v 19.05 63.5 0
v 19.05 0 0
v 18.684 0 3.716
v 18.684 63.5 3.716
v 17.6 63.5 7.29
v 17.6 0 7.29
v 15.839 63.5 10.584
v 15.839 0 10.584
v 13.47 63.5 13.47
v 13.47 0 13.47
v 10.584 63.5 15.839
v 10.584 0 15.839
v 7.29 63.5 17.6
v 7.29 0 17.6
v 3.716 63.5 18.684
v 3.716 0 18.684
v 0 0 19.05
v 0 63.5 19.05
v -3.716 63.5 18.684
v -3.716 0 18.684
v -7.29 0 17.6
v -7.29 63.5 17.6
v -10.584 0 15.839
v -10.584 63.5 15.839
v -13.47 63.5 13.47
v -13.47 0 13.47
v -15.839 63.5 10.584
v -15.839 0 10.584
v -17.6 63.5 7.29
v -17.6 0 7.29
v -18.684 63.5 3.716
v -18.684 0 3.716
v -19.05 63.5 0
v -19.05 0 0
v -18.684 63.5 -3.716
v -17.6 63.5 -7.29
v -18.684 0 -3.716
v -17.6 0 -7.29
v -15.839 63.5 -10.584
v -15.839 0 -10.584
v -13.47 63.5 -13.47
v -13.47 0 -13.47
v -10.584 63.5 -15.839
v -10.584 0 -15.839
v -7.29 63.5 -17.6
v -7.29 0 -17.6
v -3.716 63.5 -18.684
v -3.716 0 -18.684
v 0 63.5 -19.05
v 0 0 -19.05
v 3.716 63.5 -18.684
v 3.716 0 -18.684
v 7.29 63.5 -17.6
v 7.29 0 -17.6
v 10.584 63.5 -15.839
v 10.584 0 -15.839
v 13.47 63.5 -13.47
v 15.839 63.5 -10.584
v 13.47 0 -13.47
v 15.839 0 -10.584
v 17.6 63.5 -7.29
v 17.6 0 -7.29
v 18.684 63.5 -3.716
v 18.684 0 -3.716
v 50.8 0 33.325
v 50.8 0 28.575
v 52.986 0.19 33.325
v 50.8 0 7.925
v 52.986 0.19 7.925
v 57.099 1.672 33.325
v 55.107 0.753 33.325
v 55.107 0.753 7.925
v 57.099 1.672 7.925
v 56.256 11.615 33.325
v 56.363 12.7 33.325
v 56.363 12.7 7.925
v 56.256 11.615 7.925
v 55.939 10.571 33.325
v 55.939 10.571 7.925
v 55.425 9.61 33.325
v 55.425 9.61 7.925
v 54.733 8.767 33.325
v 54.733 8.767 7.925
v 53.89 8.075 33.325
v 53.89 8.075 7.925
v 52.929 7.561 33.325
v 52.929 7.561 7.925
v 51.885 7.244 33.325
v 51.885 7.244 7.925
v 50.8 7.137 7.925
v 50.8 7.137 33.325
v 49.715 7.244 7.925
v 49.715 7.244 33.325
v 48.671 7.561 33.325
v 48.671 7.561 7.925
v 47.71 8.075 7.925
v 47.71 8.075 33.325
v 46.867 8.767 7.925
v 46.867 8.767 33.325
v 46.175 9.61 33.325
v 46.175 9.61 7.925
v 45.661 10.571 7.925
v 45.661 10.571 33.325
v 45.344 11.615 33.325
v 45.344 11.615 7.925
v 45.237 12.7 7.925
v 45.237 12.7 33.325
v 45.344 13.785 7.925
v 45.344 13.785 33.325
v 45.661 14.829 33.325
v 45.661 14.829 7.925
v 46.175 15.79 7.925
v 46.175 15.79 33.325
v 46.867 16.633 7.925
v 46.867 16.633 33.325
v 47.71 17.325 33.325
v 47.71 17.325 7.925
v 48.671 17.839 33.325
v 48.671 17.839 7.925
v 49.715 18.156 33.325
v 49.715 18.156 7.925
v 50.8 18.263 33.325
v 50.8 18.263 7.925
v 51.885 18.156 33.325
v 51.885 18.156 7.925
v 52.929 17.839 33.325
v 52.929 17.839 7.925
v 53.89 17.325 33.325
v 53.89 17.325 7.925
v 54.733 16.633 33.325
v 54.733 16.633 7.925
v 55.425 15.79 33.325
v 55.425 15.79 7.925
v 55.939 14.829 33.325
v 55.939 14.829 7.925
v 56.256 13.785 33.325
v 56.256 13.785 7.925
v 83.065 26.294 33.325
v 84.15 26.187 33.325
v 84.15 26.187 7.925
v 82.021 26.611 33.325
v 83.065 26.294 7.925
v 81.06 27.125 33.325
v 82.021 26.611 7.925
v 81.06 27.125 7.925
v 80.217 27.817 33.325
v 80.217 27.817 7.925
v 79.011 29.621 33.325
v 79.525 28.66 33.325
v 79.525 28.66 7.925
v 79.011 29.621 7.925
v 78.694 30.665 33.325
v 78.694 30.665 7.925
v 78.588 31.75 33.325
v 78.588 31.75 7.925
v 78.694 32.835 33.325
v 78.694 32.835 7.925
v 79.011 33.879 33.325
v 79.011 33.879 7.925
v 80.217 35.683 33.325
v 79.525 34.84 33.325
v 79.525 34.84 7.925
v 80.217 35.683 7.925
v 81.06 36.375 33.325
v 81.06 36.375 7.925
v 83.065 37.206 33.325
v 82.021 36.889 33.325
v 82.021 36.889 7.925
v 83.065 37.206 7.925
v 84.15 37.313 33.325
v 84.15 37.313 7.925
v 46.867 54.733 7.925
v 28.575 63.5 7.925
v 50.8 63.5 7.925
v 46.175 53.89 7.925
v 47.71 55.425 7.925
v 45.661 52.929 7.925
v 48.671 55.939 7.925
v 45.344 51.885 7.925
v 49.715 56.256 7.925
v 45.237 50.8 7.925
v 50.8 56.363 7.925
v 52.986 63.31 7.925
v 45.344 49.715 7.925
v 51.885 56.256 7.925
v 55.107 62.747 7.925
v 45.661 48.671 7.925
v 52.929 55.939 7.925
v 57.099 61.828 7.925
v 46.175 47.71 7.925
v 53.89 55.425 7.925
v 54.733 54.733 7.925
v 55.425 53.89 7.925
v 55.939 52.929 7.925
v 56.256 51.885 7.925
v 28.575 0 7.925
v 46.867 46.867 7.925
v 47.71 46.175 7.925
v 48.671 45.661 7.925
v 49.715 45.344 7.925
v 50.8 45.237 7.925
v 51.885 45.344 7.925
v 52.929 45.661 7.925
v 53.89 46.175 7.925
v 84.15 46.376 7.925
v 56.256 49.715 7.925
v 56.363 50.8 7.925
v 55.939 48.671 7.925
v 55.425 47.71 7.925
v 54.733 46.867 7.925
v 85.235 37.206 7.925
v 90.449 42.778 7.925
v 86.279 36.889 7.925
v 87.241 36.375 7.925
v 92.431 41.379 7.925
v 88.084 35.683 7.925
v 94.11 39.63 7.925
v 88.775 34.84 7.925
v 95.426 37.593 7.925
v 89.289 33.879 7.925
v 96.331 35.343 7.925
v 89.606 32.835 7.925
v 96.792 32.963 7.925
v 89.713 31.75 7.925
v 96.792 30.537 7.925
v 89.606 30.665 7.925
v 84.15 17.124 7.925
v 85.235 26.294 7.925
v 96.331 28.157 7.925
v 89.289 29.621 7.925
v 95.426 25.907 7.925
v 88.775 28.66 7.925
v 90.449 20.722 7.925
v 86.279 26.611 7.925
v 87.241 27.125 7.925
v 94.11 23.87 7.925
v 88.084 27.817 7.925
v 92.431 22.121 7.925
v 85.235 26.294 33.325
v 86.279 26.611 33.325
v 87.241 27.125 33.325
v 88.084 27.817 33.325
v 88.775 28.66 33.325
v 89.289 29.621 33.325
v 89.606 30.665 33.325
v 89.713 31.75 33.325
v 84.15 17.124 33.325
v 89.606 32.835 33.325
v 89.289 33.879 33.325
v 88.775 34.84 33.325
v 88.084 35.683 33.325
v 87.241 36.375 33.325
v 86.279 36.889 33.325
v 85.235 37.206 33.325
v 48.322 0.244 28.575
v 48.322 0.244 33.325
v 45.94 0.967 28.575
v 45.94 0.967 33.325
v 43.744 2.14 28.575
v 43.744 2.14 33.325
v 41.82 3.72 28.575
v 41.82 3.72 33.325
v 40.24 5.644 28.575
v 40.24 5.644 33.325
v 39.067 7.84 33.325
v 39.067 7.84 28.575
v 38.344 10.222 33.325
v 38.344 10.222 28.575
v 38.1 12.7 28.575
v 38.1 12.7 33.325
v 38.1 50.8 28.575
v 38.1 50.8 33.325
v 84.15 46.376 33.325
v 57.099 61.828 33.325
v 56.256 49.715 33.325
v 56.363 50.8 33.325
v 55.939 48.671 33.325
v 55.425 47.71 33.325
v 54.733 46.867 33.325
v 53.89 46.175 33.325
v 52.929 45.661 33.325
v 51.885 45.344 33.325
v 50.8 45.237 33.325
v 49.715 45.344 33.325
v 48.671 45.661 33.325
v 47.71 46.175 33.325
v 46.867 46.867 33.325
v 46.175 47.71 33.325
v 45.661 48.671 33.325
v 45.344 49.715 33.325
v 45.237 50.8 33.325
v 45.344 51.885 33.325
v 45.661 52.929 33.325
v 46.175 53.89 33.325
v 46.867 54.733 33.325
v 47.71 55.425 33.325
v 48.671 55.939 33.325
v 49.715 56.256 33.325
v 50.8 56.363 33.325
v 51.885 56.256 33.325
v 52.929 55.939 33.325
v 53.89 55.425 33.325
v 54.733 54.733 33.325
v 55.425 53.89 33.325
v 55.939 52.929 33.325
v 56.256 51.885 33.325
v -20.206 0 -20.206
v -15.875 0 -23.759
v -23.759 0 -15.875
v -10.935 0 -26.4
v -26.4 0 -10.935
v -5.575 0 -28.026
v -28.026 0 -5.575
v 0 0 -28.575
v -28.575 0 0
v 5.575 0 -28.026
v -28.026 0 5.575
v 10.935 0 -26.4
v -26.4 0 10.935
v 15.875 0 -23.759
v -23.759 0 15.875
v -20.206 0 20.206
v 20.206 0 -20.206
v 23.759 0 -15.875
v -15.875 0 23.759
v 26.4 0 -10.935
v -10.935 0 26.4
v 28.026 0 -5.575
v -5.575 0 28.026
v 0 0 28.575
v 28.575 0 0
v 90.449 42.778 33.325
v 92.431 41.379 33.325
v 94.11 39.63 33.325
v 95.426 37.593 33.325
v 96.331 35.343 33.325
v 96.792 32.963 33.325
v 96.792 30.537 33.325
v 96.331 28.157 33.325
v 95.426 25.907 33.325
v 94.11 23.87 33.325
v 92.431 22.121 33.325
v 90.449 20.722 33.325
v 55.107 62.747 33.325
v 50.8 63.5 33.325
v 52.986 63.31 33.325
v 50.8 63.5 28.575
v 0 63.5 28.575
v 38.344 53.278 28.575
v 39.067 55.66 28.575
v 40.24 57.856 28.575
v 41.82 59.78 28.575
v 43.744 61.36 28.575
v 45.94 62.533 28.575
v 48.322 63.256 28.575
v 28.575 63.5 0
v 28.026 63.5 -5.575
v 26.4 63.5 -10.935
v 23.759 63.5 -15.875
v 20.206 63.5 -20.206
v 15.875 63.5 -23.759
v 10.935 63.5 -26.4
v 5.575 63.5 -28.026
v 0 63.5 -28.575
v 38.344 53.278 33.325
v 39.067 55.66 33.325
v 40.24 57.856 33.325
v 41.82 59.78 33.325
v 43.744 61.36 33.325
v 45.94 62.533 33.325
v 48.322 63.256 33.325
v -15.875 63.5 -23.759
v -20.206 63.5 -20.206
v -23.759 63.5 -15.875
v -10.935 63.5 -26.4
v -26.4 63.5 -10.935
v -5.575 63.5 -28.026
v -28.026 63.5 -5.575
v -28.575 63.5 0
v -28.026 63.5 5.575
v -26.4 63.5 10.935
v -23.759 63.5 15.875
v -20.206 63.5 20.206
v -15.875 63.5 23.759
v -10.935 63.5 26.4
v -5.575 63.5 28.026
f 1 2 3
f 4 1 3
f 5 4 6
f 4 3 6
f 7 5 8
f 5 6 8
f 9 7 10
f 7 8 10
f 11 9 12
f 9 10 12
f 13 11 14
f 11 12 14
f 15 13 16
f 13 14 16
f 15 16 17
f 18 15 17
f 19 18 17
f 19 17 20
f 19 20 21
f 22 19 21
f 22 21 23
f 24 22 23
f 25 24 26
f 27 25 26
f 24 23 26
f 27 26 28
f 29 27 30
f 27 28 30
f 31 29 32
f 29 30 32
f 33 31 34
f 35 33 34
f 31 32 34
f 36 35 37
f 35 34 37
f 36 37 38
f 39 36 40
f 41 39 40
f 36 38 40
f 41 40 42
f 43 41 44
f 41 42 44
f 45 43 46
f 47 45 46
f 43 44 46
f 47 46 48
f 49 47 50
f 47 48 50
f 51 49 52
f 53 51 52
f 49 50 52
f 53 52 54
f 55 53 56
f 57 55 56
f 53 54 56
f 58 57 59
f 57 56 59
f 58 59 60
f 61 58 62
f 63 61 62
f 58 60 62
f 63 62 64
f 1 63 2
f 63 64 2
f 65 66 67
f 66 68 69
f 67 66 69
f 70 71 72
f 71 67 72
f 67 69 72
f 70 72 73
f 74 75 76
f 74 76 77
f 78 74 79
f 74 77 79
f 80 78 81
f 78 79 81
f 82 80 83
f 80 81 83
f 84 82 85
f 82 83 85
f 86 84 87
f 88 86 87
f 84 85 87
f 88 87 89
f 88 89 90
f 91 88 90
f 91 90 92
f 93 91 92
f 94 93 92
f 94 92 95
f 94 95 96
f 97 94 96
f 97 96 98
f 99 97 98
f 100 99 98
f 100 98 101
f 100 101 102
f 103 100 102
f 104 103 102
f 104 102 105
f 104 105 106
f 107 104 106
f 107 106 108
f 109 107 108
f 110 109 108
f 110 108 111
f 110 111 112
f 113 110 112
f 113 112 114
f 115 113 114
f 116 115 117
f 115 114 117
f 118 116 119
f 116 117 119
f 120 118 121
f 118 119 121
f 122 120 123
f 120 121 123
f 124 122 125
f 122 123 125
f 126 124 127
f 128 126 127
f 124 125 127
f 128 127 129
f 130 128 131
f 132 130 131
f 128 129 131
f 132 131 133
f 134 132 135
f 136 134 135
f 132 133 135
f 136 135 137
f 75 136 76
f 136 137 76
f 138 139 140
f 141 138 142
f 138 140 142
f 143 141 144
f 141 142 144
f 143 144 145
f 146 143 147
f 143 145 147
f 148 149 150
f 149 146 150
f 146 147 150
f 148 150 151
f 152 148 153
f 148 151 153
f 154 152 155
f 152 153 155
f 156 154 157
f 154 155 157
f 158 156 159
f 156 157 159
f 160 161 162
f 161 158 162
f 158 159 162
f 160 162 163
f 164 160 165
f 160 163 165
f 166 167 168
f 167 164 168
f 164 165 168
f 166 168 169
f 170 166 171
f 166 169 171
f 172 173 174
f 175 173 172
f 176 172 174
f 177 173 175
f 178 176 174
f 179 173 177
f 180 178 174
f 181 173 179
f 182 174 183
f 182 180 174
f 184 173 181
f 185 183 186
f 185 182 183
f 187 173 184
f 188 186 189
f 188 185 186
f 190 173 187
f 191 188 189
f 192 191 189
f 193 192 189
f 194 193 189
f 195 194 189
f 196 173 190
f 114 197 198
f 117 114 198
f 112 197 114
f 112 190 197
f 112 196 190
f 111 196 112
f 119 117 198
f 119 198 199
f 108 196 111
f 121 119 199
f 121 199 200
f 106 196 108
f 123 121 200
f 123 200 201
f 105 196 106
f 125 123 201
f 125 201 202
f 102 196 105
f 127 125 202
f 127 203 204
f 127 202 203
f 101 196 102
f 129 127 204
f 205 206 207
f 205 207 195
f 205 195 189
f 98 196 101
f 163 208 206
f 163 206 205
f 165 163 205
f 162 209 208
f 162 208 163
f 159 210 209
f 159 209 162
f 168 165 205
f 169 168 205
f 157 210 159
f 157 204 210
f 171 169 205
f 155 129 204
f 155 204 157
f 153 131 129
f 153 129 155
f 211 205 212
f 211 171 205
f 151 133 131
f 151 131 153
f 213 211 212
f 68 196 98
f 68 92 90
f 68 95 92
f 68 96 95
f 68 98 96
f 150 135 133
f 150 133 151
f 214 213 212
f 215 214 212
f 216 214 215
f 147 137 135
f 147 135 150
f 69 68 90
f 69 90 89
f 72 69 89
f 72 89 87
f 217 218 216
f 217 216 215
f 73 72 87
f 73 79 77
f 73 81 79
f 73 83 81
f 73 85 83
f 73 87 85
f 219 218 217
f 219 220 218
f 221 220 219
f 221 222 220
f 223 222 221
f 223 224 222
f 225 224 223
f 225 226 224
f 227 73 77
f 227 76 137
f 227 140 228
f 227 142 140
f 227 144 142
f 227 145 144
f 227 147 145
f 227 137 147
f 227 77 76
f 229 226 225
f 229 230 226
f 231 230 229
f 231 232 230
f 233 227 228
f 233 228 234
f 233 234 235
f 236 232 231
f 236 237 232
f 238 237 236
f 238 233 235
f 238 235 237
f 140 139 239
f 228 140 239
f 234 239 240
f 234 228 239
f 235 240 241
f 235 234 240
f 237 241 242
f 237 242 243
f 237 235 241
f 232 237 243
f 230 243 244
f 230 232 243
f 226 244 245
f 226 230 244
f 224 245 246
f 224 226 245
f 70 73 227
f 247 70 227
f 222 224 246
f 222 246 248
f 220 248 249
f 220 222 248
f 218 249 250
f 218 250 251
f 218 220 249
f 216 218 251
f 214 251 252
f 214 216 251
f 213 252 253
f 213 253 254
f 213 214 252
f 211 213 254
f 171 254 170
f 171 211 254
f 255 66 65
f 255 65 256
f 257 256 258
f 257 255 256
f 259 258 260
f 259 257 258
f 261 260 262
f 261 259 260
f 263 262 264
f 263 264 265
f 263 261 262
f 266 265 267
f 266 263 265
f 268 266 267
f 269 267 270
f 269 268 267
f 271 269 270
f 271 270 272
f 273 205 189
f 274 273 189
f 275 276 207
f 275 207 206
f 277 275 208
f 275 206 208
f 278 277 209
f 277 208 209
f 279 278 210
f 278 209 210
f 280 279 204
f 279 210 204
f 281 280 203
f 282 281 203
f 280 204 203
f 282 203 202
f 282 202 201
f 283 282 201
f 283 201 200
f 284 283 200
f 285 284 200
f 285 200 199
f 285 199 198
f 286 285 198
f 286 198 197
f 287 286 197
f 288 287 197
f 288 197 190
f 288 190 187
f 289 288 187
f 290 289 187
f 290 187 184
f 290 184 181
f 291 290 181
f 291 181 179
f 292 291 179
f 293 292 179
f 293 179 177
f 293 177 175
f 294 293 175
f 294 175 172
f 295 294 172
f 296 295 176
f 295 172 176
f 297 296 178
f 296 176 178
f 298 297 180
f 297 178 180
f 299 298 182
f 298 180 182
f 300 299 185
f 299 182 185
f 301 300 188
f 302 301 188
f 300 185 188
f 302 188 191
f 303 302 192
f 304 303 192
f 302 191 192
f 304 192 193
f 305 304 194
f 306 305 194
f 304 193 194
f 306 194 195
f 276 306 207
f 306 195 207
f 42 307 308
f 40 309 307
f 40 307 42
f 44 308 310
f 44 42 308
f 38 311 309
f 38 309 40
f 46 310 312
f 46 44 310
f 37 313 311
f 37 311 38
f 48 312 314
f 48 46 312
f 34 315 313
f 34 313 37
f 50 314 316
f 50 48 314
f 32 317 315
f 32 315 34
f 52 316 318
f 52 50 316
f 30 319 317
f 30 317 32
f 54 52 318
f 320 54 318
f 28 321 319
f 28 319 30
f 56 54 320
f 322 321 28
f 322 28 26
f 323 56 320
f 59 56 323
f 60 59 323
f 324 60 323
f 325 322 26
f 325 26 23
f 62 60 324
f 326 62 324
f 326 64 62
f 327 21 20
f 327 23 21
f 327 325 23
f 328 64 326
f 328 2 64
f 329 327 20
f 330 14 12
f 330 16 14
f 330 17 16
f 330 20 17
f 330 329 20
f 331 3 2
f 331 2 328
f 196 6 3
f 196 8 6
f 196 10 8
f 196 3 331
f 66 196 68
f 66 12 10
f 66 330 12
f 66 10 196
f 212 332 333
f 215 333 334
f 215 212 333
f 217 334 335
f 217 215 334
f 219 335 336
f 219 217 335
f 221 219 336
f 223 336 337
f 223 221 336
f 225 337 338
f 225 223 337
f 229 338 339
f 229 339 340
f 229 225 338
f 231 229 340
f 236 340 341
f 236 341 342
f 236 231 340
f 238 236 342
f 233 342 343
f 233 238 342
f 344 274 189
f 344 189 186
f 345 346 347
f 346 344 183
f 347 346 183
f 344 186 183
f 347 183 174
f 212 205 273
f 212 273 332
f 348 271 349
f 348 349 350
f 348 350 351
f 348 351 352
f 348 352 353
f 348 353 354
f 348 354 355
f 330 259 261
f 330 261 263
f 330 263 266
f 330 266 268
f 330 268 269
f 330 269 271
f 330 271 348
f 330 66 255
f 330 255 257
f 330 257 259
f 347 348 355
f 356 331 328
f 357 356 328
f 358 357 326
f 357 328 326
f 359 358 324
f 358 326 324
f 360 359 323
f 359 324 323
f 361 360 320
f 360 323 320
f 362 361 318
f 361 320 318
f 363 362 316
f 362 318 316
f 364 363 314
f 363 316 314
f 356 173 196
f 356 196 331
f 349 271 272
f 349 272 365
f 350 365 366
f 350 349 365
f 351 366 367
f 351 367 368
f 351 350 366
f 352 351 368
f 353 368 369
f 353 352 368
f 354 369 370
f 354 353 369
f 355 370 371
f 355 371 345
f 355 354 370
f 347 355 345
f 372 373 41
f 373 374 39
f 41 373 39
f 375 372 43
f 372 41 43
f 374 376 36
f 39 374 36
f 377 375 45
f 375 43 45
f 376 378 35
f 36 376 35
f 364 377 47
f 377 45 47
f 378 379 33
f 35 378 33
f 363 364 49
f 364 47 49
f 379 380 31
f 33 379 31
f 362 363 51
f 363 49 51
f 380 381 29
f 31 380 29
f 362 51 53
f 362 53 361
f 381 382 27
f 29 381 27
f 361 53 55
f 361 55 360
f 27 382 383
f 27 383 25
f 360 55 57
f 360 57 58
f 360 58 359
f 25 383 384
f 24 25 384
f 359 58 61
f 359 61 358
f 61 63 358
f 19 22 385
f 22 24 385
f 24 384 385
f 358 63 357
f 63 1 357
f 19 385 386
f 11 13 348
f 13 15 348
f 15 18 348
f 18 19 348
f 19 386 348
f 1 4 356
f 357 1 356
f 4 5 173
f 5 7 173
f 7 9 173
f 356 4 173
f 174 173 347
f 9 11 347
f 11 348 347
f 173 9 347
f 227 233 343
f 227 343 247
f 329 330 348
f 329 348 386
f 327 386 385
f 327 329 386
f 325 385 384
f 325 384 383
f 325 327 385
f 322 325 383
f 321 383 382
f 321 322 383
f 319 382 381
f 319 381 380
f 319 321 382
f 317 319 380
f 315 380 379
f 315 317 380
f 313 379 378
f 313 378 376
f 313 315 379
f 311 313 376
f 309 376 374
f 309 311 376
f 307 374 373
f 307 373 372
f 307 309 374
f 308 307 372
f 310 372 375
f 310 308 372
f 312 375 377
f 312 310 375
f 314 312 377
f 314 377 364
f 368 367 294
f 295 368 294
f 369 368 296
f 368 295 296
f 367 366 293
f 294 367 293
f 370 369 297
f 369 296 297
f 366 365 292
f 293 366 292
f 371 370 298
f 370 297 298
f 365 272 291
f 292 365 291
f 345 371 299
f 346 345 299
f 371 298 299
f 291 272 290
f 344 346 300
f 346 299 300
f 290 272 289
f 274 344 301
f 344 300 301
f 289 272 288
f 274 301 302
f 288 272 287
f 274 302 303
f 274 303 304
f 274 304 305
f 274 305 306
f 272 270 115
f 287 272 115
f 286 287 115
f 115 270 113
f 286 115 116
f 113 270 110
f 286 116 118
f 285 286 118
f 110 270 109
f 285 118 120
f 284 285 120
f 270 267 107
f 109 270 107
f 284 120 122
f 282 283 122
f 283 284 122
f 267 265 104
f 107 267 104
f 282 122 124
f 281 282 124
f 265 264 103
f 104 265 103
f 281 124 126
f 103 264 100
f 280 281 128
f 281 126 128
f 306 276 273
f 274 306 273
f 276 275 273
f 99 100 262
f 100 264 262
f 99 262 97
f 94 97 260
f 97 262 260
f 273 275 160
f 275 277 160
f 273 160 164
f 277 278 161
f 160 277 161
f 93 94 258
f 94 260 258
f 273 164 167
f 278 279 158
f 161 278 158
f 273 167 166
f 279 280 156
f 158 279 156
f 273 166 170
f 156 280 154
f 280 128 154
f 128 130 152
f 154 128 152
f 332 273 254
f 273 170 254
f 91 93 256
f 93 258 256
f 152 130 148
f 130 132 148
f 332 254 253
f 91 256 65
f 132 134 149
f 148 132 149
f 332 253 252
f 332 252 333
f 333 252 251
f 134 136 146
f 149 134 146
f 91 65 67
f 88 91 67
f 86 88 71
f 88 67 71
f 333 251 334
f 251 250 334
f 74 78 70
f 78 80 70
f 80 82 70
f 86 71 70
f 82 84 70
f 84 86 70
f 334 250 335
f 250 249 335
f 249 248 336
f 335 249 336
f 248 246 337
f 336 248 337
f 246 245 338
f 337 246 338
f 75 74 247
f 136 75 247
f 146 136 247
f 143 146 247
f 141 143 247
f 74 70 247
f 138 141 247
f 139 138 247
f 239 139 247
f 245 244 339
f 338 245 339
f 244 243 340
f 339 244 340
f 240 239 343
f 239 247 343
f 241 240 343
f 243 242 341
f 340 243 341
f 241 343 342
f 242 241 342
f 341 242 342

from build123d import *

# Parameters (mm, degrees)
F0_R      = 19.05
F1_DEPTH  = 63.5
F2_W      = 50.8
F2_H      = 36.4998
F3_DEPTH  = 63.501
F5_DEPTH  = 63.501
F6_R      = 5.5626
F7_DEPTH  = 20.6502
F8_DEPTH  = 20.6512
F9_DEPTH  = 25.4
F10_DEPTH = 25.4


with BuildPart() as f1:
    # F0 (on Front) → F1 (new body)
    with BuildSketch(Plane.XZ):
        with BuildLine():
            Line((84.1502, 28.575), (0, 28.575))
            ThreePointArc((0, 28.575), (-28.575, 0), (0, -28.575))
            Line((0, -28.575), (84.1502, -28.575))
            Line((84.1502, -28.575), (84.1502, 28.575))
        make_face()
        Circle(F0_R, mode=Mode.SUBTRACT)
    extrude(amount=-F1_DEPTH)

    # F2 (on Front) → F3 (cut, through all)
    with BuildSketch(Plane.XZ):
        with Locations((58.7502, -10.3251)):
            Rectangle(F2_W, F2_H)
    extrude(amount=-F3_DEPTH, mode=Mode.SUBTRACT)

    # F4 (on Front) → F5 (cut, through all)
    with BuildSketch(Plane.XZ):
        with BuildLine():
            ThreePointArc((28.575, 0), (20.205576, -20.205576), (0, -28.575))
            Line((0, -28.575), (33.3502, -28.575))
            Line((33.3502, -28.575), (33.3502, 7.9248))
            Line((33.3502, 7.9248), (28.575, 7.9248))
            Line((28.575, 7.9248), (28.575, 0))
        make_face()
    extrude(amount=-F5_DEPTH, mode=Mode.SUBTRACT)

    # F6 (on face) → F7 (join)
    with BuildSketch(Plane(origin=(0, 0, 7.9248), x_dir=(1, 0, 0), z_dir=(0, 0, -1))):
        with BuildLine():
            ThreePointArc((84.1502, -37.3126), (78.5876, -31.75), (84.1502, -26.1874))
            Line((84.1502, -26.1874), (84.1502, -17.124132))
            Line((84.1502, -17.124132), (57.099155, -1.672279))
            ThreePointArc((57.099155, -1.672279), (54.058676, -0.425187), (50.8, 0))
            ThreePointArc((50.8, 0), (41.819744, -3.719744), (38.1, -12.7))
            Line((38.1, -12.7), (38.1, -50.8))
            ThreePointArc((38.1, -50.8), (41.819744, -59.780256), (50.8, -63.5))
            ThreePointArc((50.8, -63.5), (54.058676, -63.074813), (57.099155, -61.827721))
            Line((57.099155, -61.827721), (84.1502, -46.375868))
            Line((84.1502, -46.375868), (84.1502, -37.3126))
        make_face()
        with Locations((50.8, -50.8)):
            Circle(F6_R, mode=Mode.SUBTRACT)
        with Locations((50.8, -12.7)):
            Circle(F6_R, mode=Mode.SUBTRACT)
        with BuildLine():
            ThreePointArc((84.1502, -26.1874), (88.083552, -27.816648), (89.7128, -31.75))
            ThreePointArc((89.7128, -31.75), (88.083552, -35.683352), (84.1502, -37.3126))
            Line((84.1502, -37.3126), (84.1502, -46.375868))
            Line((84.1502, -46.375868), (90.449355, -42.777721))
            ThreePointArc((90.449355, -42.777721), (96.8502, -31.75), (90.449355, -20.722279))
            Line((90.449355, -20.722279), (84.1502, -17.124132))
            Line((84.1502, -17.124132), (84.1502, -26.1874))
        make_face()
    extrude(amount=-F7_DEPTH)

    # F6 (on face) → F8 (cut, through all)
    with BuildSketch(Plane(origin=(0, 0, 7.9248), x_dir=(1, 0, 0), z_dir=(0, 0, -1))):
        with Locations((50.8, -12.7)):
            Circle(F6_R)
        with Locations((50.8, -50.8)):
            Circle(F6_R)
        with BuildLine():
            Line((84.1502, -37.3126), (84.1502, -26.1874))
            ThreePointArc((84.1502, -26.1874), (78.5876, -31.75), (84.1502, -37.3126))
        make_face()
    extrude(amount=-F8_DEPTH, mode=Mode.SUBTRACT)

    # F6 (on face) → F9 (cut)
    with BuildSketch(Plane(origin=(0, 0, 7.9248), x_dir=(1, 0, 0), z_dir=(0, 0, -1))):
        with BuildLine():
            Line((57.099155, -1.672279), (84.1502, -17.124132))
            Line((84.1502, -17.124132), (84.1502, 0))
            Line((84.1502, 0), (50.8, 0))
            ThreePointArc((50.8, 0), (54.058676, -0.425187), (57.099155, -1.672279))
        make_face()
        with BuildLine():
            Line((84.1502, -63.5), (84.1502, -46.375868))
            Line((84.1502, -46.375868), (57.099155, -61.827721))
            ThreePointArc((57.099155, -61.827721), (54.058676, -63.074813), (50.8, -63.5))
            Line((50.8, -63.5), (84.1502, -63.5))
        make_face()
    extrude(amount=-F9_DEPTH, mode=Mode.SUBTRACT)

    # F6 (on face) → F10 (join)
    with BuildSketch(Plane(origin=(0, 0, 7.9248), x_dir=(1, 0, 0), z_dir=(0, 0, -1))):
        with BuildLine():
            ThreePointArc((84.1502, -37.3126), (78.5876, -31.75), (84.1502, -26.1874))
            Line((84.1502, -26.1874), (84.1502, -17.124132))
            Line((84.1502, -17.124132), (57.099155, -1.672279))
            ThreePointArc((57.099155, -1.672279), (54.058676, -0.425187), (50.8, 0))
            ThreePointArc((50.8, 0), (41.819744, -3.719744), (38.1, -12.7))
            Line((38.1, -12.7), (38.1, -50.8))
            ThreePointArc((38.1, -50.8), (41.819744, -59.780256), (50.8, -63.5))
            ThreePointArc((50.8, -63.5), (54.058676, -63.074813), (57.099155, -61.827721))
            Line((57.099155, -61.827721), (84.1502, -46.375868))
            Line((84.1502, -46.375868), (84.1502, -37.3126))
        make_face()
        with Locations((50.8, -50.8)):
            Circle(F6_R, mode=Mode.SUBTRACT)
        with Locations((50.8, -12.7)):
            Circle(F6_R, mode=Mode.SUBTRACT)
        with BuildLine():
            ThreePointArc((84.1502, -26.1874), (88.083552, -27.816648), (89.7128, -31.75))
            ThreePointArc((89.7128, -31.75), (88.083552, -35.683352), (84.1502, -37.3126))
            Line((84.1502, -37.3126), (84.1502, -46.375868))
            Line((84.1502, -46.375868), (90.449355, -42.777721))
            ThreePointArc((90.449355, -42.777721), (96.8502, -31.75), (90.449355, -20.722279))
            Line((90.449355, -20.722279), (84.1502, -17.124132))
            Line((84.1502, -17.124132), (84.1502, -26.1874))
        make_face()
    extrude(amount=-F10_DEPTH)


solid = f1.part
